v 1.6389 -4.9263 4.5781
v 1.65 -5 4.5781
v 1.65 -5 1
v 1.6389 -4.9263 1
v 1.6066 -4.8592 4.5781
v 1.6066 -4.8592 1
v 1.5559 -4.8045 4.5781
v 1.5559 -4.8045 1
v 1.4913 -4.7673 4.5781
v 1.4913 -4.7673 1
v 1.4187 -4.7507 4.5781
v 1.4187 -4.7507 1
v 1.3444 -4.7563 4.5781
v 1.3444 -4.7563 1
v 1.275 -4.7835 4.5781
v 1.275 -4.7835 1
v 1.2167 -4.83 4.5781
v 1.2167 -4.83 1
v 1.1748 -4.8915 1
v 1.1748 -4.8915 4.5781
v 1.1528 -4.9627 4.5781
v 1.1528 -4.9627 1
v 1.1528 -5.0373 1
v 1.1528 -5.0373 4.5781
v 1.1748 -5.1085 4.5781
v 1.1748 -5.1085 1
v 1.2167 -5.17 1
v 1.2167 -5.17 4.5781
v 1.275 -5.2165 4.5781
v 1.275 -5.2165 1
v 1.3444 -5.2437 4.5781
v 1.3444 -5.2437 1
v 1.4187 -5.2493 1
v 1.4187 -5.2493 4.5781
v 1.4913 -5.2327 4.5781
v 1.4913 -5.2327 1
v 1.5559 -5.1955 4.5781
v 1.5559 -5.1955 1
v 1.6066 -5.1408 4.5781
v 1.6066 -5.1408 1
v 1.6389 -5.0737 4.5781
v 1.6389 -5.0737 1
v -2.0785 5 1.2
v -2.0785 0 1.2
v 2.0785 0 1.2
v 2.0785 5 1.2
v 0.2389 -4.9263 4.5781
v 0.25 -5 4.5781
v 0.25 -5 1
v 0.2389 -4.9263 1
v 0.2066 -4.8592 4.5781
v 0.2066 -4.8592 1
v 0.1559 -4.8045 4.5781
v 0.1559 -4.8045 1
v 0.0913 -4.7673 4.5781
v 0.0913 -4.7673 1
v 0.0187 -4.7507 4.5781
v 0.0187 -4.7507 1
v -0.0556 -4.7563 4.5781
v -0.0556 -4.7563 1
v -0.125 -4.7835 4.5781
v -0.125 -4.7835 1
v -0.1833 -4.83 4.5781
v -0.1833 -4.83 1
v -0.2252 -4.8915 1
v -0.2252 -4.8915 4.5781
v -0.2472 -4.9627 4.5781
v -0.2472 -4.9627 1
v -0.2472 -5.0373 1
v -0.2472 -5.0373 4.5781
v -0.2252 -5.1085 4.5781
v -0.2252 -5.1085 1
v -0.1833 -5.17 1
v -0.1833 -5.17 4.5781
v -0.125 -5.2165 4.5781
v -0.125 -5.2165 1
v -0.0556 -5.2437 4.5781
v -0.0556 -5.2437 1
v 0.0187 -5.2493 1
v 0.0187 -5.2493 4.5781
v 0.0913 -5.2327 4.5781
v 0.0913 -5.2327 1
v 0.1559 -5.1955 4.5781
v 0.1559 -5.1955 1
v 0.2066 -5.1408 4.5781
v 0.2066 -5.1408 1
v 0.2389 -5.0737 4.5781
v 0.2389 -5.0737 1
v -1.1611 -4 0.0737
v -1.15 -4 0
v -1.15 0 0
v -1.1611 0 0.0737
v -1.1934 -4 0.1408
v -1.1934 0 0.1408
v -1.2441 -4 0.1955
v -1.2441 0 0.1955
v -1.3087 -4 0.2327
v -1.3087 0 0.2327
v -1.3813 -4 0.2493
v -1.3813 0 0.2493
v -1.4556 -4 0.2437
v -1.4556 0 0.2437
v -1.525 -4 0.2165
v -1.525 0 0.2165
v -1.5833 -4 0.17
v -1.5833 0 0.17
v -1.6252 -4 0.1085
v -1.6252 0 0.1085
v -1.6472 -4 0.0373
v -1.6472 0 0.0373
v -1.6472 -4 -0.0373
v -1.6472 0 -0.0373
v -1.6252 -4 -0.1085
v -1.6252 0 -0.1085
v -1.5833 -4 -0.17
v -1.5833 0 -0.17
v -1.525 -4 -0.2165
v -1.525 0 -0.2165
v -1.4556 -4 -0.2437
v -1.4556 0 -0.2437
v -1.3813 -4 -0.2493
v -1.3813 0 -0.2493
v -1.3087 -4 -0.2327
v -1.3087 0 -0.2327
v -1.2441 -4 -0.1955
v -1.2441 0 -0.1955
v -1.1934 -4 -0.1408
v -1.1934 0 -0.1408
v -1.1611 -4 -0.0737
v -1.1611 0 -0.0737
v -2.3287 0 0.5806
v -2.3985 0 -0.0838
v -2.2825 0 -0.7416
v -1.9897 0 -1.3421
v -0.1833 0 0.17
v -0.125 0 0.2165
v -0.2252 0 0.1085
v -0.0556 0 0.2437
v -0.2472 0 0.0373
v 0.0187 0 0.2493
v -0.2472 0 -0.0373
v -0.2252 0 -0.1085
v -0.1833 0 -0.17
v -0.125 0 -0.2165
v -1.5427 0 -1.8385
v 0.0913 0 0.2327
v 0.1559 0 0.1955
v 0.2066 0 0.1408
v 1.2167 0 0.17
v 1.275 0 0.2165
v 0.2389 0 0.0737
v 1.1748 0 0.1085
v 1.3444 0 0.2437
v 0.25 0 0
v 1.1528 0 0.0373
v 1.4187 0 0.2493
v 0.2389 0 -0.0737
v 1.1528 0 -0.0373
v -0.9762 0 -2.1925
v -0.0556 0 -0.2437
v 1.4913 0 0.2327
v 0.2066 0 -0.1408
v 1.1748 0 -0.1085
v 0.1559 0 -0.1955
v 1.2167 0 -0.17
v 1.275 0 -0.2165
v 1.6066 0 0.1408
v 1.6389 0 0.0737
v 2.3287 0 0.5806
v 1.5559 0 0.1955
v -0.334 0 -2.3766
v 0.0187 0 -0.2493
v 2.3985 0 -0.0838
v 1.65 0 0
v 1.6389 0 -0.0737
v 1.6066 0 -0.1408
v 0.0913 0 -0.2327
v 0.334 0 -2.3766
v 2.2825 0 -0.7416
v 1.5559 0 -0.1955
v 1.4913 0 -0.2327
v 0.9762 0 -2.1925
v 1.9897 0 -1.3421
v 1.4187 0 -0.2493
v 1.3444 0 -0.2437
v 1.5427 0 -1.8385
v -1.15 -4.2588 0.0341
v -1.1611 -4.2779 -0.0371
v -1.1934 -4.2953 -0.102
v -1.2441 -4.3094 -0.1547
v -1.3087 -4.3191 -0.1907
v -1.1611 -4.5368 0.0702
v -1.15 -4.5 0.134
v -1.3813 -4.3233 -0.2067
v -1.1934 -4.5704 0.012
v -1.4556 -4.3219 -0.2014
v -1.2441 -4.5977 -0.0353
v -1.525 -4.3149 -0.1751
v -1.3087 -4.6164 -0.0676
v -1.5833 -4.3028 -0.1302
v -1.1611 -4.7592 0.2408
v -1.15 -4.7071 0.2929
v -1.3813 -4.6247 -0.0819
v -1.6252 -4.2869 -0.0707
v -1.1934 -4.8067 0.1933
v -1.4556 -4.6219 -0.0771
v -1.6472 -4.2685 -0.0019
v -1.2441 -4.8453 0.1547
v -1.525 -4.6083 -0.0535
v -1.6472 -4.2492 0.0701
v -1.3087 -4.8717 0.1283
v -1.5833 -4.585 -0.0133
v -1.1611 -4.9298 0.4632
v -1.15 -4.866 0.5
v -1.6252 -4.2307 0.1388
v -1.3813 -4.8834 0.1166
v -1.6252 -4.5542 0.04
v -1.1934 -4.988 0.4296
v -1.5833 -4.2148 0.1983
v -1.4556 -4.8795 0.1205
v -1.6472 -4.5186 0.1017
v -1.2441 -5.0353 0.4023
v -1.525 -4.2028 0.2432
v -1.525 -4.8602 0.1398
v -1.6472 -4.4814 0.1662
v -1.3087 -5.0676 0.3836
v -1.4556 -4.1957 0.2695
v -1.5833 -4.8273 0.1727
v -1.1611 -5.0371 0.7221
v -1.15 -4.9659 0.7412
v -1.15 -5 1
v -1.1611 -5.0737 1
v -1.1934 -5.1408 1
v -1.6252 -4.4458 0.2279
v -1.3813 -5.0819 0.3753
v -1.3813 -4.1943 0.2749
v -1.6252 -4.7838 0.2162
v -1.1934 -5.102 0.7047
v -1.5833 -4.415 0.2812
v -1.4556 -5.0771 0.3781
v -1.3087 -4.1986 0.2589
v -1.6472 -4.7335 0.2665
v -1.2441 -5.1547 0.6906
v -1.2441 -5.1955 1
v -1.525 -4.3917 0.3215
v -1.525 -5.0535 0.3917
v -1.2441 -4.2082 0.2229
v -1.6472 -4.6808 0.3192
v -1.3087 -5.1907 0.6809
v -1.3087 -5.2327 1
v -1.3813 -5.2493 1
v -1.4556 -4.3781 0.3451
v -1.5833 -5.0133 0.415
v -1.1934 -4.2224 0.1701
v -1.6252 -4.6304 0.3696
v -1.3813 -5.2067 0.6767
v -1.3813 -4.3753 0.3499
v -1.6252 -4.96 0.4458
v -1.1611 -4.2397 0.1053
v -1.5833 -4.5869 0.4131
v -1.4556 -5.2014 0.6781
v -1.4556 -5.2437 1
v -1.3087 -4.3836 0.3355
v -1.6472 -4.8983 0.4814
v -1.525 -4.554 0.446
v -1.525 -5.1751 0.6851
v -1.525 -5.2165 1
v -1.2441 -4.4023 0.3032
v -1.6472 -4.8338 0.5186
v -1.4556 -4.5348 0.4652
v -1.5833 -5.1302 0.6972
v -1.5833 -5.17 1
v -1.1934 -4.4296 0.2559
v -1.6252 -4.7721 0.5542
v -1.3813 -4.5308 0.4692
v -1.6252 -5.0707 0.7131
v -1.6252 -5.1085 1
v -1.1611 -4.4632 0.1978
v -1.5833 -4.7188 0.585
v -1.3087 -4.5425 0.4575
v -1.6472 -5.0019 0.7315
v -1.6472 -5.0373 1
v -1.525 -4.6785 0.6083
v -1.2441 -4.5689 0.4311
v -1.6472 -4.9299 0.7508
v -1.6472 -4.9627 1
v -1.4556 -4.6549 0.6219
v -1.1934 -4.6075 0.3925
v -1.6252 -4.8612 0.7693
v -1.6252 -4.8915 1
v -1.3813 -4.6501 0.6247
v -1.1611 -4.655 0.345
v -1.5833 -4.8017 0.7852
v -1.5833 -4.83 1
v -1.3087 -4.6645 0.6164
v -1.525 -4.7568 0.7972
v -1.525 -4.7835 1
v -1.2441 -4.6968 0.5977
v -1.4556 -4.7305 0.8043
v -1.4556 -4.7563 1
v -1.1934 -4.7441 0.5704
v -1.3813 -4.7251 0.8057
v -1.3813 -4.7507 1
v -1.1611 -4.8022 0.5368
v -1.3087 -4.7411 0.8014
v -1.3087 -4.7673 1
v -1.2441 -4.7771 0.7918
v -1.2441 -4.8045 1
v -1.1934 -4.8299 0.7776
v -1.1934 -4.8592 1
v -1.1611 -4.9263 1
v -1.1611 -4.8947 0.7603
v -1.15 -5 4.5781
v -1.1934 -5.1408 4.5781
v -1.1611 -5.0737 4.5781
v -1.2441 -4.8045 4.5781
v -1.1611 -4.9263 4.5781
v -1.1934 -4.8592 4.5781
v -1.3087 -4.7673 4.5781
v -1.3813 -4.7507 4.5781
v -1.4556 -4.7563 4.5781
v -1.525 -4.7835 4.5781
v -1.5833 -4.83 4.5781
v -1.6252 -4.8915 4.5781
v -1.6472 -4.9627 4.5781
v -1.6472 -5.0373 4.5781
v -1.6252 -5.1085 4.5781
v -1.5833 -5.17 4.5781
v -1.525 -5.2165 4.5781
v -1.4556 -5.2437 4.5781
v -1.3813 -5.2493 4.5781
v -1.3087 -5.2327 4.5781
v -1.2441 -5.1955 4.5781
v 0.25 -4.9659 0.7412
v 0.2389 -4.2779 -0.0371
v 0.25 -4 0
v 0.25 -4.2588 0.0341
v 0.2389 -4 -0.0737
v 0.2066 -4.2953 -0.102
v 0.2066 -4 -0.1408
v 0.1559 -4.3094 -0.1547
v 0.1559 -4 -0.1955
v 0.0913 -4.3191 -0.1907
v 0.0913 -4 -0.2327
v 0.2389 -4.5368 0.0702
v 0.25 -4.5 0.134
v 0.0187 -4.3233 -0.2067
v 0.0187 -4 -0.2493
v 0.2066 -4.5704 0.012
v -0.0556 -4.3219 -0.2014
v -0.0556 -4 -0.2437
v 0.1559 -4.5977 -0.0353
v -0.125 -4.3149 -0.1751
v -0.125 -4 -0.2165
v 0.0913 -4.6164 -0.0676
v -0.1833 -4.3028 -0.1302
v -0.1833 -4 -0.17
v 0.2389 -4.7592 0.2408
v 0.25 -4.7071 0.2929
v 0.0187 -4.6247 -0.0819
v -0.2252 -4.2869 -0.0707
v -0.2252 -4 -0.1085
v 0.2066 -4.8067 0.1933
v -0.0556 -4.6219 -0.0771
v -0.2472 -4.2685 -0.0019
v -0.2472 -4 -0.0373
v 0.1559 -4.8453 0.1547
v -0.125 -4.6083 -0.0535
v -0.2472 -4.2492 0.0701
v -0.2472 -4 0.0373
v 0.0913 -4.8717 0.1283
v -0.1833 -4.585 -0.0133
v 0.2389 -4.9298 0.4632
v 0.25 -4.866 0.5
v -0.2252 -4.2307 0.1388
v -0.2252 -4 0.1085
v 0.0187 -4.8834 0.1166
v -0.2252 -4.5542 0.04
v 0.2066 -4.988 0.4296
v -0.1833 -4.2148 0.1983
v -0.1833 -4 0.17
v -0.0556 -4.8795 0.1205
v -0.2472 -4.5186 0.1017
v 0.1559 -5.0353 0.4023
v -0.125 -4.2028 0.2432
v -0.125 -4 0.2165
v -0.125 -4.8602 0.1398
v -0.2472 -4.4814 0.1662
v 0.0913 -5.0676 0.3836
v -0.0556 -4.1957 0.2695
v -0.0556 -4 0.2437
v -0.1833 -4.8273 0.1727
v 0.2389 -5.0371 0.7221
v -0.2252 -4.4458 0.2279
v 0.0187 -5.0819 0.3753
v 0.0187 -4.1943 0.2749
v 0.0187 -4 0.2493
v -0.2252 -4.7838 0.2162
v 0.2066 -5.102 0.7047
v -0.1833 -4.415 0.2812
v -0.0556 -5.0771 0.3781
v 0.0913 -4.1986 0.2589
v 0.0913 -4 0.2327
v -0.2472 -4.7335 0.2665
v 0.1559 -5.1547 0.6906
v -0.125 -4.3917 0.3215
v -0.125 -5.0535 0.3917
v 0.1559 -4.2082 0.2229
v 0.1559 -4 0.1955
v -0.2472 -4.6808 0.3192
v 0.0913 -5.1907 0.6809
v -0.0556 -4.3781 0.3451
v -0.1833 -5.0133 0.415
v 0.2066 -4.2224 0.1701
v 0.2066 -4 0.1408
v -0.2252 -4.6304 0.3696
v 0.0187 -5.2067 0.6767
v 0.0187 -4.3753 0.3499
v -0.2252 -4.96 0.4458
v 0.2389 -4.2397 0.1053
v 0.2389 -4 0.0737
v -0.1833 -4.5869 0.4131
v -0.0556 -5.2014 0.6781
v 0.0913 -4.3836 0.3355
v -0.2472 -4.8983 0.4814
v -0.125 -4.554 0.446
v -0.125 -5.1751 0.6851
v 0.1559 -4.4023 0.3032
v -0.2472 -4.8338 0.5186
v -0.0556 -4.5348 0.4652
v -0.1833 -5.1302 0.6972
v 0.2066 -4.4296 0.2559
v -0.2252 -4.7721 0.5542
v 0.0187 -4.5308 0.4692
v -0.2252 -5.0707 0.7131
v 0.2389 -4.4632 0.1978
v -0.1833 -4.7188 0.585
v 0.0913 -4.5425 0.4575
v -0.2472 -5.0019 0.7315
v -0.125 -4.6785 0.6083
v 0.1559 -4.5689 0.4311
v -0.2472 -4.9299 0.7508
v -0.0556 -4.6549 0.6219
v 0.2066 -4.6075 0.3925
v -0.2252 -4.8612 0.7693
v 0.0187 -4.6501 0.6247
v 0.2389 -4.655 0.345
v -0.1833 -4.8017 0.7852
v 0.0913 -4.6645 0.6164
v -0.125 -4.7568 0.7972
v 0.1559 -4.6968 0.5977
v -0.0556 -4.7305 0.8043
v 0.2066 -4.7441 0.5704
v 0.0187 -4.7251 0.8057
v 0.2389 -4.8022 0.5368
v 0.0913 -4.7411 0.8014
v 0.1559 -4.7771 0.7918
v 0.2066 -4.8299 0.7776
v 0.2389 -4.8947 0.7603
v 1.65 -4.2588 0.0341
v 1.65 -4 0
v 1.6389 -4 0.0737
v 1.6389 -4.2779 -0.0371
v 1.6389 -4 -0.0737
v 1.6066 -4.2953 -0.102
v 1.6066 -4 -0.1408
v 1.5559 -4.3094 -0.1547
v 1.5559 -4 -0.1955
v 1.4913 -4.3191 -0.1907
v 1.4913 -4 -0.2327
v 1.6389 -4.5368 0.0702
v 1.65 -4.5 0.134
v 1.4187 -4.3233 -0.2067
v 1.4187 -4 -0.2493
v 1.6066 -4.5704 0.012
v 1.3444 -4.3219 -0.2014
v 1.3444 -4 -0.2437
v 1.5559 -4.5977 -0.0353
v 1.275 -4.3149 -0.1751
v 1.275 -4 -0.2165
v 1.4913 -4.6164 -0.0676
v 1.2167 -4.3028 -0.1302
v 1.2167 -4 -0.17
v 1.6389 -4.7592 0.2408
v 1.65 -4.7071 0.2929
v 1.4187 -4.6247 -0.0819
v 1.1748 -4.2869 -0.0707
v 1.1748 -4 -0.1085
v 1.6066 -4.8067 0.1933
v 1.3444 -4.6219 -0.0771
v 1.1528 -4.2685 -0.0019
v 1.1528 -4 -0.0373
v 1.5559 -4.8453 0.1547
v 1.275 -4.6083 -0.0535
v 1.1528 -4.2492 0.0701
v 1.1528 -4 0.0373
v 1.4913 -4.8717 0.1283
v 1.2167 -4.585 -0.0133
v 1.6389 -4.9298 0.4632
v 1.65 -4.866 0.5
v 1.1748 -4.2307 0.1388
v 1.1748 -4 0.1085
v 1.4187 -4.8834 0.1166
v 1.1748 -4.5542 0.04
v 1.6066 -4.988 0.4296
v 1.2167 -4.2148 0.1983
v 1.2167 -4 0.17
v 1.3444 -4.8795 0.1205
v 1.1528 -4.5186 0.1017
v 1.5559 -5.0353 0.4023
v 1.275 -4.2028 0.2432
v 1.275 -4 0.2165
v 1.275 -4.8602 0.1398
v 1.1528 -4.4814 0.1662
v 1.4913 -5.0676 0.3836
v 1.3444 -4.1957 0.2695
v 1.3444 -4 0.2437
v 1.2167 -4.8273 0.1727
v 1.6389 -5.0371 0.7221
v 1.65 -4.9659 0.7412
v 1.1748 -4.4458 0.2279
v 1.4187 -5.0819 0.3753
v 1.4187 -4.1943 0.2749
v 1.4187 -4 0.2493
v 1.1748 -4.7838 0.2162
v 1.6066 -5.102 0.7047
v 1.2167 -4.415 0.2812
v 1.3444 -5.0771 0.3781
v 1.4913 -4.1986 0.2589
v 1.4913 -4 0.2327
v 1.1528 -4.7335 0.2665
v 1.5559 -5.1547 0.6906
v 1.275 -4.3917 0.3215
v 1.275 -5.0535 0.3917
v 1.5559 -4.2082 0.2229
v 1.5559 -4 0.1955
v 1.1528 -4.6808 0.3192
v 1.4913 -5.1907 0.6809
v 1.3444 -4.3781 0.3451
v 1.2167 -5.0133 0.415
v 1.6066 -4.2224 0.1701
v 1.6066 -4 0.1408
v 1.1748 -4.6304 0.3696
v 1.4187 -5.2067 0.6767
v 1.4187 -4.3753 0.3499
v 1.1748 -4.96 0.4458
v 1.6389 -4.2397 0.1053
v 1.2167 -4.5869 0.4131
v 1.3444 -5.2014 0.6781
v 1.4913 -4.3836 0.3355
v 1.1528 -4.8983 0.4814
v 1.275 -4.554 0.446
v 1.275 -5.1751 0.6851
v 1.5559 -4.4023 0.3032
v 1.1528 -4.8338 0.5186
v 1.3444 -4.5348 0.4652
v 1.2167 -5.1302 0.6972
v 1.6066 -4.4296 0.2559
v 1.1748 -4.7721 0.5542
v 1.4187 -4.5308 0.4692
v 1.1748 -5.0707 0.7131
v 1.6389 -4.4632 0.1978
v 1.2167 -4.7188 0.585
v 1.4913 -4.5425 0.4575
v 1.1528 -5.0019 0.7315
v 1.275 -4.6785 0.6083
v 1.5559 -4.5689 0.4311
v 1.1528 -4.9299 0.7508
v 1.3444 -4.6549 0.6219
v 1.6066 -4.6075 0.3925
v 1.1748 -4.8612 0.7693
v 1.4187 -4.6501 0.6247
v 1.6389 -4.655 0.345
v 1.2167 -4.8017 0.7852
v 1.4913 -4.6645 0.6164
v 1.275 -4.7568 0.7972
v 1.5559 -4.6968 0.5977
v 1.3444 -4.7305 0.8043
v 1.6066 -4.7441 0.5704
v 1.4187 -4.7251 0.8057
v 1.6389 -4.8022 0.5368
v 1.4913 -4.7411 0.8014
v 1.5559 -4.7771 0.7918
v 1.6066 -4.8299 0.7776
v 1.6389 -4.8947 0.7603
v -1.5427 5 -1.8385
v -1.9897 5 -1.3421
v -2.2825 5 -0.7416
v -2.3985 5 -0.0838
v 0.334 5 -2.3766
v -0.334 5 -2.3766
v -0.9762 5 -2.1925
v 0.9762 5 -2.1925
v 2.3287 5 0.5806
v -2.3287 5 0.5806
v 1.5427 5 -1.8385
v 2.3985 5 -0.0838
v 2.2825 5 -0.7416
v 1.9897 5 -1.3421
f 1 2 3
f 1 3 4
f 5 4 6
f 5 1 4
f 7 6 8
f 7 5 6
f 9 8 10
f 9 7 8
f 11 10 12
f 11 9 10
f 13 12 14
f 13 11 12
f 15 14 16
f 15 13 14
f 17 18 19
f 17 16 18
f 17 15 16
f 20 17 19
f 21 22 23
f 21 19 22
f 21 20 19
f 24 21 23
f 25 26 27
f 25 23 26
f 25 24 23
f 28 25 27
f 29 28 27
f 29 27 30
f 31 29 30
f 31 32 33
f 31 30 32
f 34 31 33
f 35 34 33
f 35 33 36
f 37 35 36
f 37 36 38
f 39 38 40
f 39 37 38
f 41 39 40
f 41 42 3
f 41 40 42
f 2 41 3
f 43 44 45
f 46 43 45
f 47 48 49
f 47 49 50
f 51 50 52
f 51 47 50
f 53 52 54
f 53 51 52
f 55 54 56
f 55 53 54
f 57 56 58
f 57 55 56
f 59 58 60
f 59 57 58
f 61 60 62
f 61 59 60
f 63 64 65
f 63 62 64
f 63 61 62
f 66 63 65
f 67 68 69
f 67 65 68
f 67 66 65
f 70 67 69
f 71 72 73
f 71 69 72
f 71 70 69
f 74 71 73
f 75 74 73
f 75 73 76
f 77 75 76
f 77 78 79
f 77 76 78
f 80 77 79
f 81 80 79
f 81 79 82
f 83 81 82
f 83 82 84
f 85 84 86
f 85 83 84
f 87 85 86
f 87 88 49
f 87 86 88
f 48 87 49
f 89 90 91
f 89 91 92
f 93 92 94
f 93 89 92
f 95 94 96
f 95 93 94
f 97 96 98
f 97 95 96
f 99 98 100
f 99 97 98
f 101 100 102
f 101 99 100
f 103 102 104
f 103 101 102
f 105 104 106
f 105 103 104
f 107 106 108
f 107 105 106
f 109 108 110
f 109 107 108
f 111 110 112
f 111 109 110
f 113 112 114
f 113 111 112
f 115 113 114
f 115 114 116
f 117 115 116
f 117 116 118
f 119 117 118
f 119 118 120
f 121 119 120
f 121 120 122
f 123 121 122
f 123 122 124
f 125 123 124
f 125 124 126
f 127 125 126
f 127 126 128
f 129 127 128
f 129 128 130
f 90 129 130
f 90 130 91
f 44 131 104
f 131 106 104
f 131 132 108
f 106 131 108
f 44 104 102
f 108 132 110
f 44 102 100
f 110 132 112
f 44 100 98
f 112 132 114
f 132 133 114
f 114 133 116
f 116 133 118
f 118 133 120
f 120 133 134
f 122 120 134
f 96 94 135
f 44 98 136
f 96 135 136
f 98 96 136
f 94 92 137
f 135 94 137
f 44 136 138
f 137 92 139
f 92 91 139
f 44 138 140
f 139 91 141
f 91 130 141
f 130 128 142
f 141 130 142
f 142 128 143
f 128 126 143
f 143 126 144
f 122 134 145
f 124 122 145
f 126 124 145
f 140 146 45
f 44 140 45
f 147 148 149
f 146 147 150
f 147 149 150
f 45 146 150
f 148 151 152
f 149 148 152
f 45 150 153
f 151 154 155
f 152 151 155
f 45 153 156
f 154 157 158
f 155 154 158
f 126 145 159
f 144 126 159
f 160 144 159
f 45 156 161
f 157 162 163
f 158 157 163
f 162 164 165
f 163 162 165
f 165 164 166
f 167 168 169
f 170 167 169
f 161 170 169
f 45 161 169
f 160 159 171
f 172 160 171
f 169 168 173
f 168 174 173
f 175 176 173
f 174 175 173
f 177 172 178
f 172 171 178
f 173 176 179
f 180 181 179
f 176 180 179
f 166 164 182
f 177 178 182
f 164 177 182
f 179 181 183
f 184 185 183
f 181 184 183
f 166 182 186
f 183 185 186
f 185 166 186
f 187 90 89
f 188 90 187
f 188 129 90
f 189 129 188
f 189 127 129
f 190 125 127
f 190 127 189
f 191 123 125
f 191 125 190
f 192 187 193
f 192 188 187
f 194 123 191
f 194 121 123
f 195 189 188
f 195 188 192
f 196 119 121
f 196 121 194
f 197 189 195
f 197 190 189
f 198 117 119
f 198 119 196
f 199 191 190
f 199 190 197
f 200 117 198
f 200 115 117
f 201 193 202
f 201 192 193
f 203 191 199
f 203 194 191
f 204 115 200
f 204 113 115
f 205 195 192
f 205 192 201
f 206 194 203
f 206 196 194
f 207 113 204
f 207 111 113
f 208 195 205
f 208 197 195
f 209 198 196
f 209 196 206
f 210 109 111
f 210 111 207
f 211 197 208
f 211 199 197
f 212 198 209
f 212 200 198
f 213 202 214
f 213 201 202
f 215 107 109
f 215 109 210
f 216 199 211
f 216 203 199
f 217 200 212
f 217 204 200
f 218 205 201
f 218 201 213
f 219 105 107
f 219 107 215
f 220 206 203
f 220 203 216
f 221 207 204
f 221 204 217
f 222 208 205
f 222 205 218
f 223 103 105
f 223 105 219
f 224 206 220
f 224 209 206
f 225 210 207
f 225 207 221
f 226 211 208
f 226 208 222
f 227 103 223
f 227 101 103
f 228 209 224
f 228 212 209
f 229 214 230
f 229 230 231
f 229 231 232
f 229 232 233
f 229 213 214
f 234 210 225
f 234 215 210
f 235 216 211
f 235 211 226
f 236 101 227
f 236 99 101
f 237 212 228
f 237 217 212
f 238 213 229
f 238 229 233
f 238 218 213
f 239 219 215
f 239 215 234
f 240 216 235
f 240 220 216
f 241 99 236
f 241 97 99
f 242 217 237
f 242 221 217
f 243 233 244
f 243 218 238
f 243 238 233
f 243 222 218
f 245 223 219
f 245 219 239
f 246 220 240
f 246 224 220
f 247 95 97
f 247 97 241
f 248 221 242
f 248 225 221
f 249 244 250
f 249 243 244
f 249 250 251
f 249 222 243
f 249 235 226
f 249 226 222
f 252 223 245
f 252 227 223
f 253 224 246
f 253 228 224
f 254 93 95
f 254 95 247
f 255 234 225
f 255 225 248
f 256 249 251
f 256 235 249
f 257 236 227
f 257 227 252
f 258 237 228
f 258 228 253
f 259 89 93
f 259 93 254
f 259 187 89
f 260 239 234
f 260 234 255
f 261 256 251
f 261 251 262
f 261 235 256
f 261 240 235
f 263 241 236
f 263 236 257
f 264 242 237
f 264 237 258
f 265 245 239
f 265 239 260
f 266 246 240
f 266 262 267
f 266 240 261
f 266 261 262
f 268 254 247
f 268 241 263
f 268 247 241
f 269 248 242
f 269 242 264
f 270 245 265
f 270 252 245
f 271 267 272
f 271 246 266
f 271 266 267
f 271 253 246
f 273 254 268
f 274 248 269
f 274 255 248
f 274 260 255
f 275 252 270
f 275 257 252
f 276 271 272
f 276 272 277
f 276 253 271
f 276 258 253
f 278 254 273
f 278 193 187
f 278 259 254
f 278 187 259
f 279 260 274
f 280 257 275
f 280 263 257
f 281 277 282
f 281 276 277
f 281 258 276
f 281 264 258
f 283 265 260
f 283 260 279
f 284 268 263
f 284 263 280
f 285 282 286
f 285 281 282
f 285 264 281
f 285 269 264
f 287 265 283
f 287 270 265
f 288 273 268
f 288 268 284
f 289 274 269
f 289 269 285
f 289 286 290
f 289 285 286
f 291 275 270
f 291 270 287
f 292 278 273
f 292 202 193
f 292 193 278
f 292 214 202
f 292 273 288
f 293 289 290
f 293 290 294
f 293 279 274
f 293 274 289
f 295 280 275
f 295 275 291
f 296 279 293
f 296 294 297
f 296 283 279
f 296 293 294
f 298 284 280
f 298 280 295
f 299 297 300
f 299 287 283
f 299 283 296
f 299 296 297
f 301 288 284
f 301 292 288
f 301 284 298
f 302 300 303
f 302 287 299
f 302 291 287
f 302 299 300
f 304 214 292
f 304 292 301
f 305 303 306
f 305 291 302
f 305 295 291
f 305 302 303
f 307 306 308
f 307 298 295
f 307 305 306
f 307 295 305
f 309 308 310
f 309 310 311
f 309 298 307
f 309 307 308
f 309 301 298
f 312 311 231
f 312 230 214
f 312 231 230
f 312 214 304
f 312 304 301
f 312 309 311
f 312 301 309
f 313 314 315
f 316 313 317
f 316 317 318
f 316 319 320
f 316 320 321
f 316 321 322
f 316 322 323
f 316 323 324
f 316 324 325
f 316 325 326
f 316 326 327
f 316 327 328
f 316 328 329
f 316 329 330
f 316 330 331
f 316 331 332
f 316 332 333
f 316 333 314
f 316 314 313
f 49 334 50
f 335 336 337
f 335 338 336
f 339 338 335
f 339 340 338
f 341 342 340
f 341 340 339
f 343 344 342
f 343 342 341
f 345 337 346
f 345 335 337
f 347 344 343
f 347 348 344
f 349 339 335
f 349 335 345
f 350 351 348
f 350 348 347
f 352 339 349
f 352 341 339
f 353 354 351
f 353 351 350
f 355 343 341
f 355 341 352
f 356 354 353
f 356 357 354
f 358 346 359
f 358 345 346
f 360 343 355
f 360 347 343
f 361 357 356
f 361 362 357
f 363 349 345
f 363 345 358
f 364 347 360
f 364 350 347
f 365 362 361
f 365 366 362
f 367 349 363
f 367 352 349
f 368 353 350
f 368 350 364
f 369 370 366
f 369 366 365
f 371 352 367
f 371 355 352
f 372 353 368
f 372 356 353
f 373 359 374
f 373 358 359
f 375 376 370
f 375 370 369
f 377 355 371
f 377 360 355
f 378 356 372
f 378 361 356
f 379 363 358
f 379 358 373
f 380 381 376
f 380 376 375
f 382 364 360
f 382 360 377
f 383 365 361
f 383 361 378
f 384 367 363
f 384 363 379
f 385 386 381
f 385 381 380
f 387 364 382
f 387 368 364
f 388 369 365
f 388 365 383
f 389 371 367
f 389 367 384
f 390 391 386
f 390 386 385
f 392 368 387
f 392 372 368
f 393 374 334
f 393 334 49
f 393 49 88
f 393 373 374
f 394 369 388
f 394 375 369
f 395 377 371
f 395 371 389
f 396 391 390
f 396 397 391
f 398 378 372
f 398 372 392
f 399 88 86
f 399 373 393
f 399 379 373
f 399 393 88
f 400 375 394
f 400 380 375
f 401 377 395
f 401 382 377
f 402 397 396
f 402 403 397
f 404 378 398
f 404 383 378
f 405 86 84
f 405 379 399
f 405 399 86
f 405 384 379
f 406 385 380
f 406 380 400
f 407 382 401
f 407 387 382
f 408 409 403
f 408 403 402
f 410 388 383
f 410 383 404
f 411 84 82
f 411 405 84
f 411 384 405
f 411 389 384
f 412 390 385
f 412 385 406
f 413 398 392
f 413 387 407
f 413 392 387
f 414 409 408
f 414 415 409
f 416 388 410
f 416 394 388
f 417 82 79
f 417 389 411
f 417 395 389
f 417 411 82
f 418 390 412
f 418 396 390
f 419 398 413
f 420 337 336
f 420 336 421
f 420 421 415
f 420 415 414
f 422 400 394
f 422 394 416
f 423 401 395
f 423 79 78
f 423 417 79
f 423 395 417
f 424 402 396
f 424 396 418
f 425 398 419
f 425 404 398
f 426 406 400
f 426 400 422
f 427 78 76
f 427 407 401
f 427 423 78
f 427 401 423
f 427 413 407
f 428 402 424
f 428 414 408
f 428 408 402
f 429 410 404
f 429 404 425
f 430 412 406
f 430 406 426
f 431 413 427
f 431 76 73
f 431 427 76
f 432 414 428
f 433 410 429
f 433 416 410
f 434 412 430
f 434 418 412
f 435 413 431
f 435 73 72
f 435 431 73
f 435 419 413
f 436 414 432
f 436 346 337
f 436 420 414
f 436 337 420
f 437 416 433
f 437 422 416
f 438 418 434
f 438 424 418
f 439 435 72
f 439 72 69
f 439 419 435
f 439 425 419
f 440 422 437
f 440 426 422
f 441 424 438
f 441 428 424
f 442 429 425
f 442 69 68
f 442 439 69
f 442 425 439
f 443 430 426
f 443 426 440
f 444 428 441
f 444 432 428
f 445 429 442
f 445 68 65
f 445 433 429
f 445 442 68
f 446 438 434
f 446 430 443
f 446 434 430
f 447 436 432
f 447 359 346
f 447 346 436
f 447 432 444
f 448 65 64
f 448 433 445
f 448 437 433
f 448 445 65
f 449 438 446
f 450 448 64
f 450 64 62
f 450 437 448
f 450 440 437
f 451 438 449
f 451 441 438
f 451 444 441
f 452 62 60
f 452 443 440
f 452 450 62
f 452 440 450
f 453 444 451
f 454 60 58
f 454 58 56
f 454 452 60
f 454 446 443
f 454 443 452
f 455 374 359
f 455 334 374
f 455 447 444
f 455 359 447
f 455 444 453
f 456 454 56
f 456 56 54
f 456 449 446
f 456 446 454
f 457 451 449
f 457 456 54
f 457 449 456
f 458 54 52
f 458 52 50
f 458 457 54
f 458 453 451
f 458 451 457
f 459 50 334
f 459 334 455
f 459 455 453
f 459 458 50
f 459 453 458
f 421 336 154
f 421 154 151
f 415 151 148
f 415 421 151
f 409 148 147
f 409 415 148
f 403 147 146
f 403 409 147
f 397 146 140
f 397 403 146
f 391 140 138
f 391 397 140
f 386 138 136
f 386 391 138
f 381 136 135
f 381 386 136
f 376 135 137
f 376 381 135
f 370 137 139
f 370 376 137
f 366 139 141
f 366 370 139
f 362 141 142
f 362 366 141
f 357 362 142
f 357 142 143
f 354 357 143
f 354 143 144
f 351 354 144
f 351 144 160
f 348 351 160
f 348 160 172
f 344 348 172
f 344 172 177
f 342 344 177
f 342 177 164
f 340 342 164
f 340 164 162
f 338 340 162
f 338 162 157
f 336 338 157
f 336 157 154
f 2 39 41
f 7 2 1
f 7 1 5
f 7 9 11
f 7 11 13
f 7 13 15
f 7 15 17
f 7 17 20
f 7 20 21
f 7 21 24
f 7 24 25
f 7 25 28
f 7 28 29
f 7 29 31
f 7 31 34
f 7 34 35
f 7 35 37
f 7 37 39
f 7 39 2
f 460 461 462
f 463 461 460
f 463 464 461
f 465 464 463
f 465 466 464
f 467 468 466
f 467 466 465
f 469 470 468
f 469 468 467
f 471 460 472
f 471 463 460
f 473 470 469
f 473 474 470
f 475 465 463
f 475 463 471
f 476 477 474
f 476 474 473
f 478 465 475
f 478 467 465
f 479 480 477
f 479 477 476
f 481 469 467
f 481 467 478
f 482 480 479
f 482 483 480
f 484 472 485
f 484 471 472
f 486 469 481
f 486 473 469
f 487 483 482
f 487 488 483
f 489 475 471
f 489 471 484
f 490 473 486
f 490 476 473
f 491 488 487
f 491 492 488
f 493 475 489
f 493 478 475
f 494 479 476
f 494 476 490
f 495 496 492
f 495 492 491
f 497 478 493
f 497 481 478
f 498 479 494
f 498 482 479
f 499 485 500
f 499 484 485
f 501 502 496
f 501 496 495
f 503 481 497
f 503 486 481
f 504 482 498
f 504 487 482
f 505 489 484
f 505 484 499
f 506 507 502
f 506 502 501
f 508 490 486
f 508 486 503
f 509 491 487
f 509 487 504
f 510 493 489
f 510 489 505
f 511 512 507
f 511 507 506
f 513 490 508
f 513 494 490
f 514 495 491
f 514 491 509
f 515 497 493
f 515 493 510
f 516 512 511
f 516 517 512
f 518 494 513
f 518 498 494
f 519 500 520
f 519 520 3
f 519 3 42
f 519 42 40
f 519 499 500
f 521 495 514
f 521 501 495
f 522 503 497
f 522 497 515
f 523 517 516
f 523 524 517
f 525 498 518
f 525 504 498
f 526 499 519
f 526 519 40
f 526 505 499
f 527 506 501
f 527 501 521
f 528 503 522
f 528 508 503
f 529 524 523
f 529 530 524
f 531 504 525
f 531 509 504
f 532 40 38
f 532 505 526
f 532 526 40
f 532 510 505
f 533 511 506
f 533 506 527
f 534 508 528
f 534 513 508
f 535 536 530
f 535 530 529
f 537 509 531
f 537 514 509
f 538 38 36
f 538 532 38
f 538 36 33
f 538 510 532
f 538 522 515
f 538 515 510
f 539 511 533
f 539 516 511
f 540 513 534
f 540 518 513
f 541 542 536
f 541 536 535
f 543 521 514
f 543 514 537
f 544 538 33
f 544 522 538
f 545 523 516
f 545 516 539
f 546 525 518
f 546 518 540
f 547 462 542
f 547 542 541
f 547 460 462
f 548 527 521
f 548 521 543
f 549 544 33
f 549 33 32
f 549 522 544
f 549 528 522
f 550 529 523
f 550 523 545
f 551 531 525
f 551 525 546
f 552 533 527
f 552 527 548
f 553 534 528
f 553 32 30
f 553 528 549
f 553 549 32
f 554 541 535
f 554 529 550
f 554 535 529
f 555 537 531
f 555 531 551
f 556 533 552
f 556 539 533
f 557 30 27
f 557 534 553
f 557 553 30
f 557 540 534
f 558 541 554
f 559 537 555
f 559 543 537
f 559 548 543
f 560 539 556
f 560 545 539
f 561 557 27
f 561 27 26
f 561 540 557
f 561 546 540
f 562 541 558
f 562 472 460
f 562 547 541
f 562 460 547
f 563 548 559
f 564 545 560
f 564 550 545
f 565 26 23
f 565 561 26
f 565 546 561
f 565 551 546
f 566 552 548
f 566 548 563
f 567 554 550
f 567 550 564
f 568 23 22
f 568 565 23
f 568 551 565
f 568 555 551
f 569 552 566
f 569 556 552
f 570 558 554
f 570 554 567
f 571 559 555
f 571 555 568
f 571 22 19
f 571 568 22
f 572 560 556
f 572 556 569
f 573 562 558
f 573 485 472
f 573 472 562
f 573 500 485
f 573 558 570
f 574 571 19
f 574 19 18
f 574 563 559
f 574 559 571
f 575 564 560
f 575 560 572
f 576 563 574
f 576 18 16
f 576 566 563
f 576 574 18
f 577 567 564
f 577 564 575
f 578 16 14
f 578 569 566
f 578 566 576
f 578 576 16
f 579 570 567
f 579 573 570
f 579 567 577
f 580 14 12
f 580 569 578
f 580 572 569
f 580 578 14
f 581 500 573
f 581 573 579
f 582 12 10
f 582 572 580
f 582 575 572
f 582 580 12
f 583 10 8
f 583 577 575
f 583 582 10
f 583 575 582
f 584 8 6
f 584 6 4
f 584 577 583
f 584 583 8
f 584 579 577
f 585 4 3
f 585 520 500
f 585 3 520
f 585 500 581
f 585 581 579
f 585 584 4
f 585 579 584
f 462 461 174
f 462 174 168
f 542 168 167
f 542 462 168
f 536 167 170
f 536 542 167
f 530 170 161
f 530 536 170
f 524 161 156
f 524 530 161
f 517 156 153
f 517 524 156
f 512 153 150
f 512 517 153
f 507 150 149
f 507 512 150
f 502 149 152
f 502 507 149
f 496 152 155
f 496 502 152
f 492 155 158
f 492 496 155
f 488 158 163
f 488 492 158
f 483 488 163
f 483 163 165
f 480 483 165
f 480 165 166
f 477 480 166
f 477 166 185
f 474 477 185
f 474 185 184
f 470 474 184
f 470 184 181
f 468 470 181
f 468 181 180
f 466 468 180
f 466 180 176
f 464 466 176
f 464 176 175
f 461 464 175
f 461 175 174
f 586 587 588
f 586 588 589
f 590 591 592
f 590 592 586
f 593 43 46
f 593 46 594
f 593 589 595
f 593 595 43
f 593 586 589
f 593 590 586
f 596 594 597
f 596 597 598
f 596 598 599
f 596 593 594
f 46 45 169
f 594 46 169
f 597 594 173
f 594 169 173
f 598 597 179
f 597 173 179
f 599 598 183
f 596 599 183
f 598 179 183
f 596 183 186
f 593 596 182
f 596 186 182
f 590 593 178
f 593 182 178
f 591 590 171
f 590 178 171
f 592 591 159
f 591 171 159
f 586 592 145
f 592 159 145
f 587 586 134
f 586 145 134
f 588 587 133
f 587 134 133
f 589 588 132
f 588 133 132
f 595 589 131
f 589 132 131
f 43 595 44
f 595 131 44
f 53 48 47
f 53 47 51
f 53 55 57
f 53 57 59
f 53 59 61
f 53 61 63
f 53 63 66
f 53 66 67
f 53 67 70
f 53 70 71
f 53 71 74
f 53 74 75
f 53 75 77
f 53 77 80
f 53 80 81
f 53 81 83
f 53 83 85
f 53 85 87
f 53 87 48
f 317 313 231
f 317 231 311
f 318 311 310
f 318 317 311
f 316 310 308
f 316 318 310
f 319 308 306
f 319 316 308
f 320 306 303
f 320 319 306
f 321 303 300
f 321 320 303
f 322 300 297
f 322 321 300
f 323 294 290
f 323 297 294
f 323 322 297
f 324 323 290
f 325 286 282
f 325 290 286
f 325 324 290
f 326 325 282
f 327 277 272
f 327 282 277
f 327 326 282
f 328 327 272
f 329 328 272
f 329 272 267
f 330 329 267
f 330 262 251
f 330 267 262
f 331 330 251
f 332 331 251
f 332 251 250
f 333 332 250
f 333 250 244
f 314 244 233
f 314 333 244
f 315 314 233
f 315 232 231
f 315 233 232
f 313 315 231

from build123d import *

# Parameters (mm, degrees)
EXTRUSION1_DEPTH = 5
ESQUISSE6_R      = 0.25


with BuildPart() as part:
    # Esquisse2 → Extrusion1 (new body)
    with BuildSketch(Plane(origin=(0, 0, 0), x_dir=(1, 0, 0), z_dir=(0, 1, 0))):
        with BuildLine():
            Line((-2.078460969, -1.2), (2.078460969, -1.2))
            ThreePointArc((2.078460969, -1.2), (0, 2.4), (-2.078460969, -1.2))
        make_face()
    extrude(amount=EXTRUSION1_DEPTH)

    # Balayage1: sweep along a path in Esquisse8
    with BuildLine(Plane(origin=(0, 0, 0), x_dir=(0, 0, -1), z_dir=(1, 0, 0))) as balayage1_path:
        Line((0, 0), (0, -4))
        ThreePointArc((0, -4), (-0.292893219, -4.707106781), (-1, -5))
        Line((-1, -5), (-4.578130226, -5))
    # Esquisse6 → Balayage1 (sweep)
    with BuildSketch(Plane.XZ):
        Circle(ESQUISSE6_R)
        with Locations((1.4, 0)):
            Circle(ESQUISSE6_R)
        with Locations((-1.4, 0)):
            Circle(ESQUISSE6_R)
    sweep(path=balayage1_path.line)


solid = part.part
